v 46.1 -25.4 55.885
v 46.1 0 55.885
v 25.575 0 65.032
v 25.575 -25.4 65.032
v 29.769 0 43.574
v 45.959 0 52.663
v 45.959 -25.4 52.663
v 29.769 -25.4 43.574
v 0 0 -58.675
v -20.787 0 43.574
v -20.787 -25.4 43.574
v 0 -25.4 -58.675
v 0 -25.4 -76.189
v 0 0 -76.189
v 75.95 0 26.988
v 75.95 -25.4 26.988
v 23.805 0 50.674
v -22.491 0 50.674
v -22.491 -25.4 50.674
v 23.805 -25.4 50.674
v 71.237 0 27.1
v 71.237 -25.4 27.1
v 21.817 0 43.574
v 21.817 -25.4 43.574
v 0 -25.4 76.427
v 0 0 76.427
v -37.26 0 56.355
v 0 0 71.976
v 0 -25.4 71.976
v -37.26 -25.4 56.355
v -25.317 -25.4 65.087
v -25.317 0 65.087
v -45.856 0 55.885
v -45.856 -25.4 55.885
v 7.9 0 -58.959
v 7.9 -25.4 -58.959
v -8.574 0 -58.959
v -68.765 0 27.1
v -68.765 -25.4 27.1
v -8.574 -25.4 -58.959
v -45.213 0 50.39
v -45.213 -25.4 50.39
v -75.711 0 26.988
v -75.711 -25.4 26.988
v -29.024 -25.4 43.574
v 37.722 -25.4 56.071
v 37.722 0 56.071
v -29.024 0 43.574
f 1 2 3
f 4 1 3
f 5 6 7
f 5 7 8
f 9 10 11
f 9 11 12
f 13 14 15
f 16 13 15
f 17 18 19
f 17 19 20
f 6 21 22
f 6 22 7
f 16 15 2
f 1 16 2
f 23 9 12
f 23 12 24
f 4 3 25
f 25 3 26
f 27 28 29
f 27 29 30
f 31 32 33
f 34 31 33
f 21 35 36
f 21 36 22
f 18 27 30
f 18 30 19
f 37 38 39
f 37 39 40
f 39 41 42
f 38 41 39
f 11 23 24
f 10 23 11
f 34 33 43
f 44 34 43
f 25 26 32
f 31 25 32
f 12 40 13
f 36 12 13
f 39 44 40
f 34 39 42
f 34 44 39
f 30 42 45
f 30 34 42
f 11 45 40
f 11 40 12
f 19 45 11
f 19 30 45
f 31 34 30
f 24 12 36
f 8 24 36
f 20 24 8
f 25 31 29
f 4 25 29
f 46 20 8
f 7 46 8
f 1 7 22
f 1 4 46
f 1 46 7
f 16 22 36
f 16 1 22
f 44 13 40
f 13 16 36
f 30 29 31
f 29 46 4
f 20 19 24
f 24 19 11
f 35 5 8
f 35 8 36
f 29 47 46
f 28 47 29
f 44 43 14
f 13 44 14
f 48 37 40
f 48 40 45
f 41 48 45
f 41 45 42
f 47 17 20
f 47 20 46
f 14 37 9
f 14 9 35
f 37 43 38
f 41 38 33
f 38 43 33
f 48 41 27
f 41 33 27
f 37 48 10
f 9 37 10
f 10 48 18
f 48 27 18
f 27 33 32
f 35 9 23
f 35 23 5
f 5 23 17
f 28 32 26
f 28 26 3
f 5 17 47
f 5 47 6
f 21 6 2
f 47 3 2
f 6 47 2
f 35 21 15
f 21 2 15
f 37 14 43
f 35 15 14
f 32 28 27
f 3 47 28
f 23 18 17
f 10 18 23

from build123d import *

# Parameters (mm, degrees)
F3_DEPTH = 25.4
F4_DEPTH = 30.48
F7_DEPTH = 50.8


with BuildPart() as f3:
    # F0 (on Front) → F3 (new body)
    with BuildSketch(Plane.XZ):
        Polygon((-75.71096, 26.988449), (0, -76.188624), (-25.316598, 47.161441), (-45.85648, 55.885422), align=None)
        Polygon((26.625417, 47.161441), (0, -76.188624), (75.949796, 26.988449), (46.100167, 55.885422), align=None)
        Polygon((-25.316598, 47.161441), (0, -76.188624), (26.625417, 47.161441), align=None)
        Polygon((-45.85648, 55.885422), (-25.316598, 47.161441), (-15.569561, 60.743305), (-25.316598, 65.086543), align=None)
        Polygon((-15.569561, 60.743305), (16.001999, 60.743305), (25.57465, 65.031505), (0, 76.42746), (-25.316598, 65.086543), align=None)
        Polygon((16.001999, 60.743305), (26.625417, 47.161441), (46.100167, 55.885422), (25.57465, 65.031505), align=None)
        Polygon((-25.316598, 47.161441), (26.625417, 47.161441), (16.001999, 60.743305), (-15.569561, 60.743305), align=None)
    extrude(amount=F3_DEPTH)

    # F1 (on Front) + F2 (on Front) → F4 (cut)
    with BuildSketch(Plane.XZ):
        Polygon((-68.764952, 27.100321), (-8.573943, -58.959331), (-29.023757, 43.573789), (-45.213196, 50.390389), align=None)
        Polygon((71.237154, 27.100321), (45.95891, 52.662592), (29.769467, 43.573789), (7.899523, -58.959331), align=None)
    with BuildSketch(Plane.XZ):
        Polygon((21.816764, 43.573789), (-20.787027, 43.573789), (0, -58.675308), align=None)
        Polygon((0, 71.976312), (-37.260491, 56.354925), (-22.491178, 50.67442), (23.804942, 50.67442), (37.722178, 56.070898), align=None)
    extrude(amount=F4_DEPTH, mode=Mode.SUBTRACT)

    # F5 (on Front) + F6 (on Front) → F7 (cut)
    with BuildSketch(Plane.XZ):
        Polygon((-33.284139, 39.881457), (-44.929173, 44.993915), (-62.822767, 26.248246), (-17.946774, -37.373412), align=None)
    with BuildSketch(Plane.XZ):
        Polygon((16.420284, 39.029382), (-15.390549, 39.029382), (0, -39.361589), align=None)
        Polygon((64.420559, 26.816297), (44.822805, 46.698064), (33.177774, 39.029382), (16.420284, -39.361589), align=None)
    extrude(amount=F7_DEPTH, mode=Mode.SUBTRACT)


solid = f3.part
